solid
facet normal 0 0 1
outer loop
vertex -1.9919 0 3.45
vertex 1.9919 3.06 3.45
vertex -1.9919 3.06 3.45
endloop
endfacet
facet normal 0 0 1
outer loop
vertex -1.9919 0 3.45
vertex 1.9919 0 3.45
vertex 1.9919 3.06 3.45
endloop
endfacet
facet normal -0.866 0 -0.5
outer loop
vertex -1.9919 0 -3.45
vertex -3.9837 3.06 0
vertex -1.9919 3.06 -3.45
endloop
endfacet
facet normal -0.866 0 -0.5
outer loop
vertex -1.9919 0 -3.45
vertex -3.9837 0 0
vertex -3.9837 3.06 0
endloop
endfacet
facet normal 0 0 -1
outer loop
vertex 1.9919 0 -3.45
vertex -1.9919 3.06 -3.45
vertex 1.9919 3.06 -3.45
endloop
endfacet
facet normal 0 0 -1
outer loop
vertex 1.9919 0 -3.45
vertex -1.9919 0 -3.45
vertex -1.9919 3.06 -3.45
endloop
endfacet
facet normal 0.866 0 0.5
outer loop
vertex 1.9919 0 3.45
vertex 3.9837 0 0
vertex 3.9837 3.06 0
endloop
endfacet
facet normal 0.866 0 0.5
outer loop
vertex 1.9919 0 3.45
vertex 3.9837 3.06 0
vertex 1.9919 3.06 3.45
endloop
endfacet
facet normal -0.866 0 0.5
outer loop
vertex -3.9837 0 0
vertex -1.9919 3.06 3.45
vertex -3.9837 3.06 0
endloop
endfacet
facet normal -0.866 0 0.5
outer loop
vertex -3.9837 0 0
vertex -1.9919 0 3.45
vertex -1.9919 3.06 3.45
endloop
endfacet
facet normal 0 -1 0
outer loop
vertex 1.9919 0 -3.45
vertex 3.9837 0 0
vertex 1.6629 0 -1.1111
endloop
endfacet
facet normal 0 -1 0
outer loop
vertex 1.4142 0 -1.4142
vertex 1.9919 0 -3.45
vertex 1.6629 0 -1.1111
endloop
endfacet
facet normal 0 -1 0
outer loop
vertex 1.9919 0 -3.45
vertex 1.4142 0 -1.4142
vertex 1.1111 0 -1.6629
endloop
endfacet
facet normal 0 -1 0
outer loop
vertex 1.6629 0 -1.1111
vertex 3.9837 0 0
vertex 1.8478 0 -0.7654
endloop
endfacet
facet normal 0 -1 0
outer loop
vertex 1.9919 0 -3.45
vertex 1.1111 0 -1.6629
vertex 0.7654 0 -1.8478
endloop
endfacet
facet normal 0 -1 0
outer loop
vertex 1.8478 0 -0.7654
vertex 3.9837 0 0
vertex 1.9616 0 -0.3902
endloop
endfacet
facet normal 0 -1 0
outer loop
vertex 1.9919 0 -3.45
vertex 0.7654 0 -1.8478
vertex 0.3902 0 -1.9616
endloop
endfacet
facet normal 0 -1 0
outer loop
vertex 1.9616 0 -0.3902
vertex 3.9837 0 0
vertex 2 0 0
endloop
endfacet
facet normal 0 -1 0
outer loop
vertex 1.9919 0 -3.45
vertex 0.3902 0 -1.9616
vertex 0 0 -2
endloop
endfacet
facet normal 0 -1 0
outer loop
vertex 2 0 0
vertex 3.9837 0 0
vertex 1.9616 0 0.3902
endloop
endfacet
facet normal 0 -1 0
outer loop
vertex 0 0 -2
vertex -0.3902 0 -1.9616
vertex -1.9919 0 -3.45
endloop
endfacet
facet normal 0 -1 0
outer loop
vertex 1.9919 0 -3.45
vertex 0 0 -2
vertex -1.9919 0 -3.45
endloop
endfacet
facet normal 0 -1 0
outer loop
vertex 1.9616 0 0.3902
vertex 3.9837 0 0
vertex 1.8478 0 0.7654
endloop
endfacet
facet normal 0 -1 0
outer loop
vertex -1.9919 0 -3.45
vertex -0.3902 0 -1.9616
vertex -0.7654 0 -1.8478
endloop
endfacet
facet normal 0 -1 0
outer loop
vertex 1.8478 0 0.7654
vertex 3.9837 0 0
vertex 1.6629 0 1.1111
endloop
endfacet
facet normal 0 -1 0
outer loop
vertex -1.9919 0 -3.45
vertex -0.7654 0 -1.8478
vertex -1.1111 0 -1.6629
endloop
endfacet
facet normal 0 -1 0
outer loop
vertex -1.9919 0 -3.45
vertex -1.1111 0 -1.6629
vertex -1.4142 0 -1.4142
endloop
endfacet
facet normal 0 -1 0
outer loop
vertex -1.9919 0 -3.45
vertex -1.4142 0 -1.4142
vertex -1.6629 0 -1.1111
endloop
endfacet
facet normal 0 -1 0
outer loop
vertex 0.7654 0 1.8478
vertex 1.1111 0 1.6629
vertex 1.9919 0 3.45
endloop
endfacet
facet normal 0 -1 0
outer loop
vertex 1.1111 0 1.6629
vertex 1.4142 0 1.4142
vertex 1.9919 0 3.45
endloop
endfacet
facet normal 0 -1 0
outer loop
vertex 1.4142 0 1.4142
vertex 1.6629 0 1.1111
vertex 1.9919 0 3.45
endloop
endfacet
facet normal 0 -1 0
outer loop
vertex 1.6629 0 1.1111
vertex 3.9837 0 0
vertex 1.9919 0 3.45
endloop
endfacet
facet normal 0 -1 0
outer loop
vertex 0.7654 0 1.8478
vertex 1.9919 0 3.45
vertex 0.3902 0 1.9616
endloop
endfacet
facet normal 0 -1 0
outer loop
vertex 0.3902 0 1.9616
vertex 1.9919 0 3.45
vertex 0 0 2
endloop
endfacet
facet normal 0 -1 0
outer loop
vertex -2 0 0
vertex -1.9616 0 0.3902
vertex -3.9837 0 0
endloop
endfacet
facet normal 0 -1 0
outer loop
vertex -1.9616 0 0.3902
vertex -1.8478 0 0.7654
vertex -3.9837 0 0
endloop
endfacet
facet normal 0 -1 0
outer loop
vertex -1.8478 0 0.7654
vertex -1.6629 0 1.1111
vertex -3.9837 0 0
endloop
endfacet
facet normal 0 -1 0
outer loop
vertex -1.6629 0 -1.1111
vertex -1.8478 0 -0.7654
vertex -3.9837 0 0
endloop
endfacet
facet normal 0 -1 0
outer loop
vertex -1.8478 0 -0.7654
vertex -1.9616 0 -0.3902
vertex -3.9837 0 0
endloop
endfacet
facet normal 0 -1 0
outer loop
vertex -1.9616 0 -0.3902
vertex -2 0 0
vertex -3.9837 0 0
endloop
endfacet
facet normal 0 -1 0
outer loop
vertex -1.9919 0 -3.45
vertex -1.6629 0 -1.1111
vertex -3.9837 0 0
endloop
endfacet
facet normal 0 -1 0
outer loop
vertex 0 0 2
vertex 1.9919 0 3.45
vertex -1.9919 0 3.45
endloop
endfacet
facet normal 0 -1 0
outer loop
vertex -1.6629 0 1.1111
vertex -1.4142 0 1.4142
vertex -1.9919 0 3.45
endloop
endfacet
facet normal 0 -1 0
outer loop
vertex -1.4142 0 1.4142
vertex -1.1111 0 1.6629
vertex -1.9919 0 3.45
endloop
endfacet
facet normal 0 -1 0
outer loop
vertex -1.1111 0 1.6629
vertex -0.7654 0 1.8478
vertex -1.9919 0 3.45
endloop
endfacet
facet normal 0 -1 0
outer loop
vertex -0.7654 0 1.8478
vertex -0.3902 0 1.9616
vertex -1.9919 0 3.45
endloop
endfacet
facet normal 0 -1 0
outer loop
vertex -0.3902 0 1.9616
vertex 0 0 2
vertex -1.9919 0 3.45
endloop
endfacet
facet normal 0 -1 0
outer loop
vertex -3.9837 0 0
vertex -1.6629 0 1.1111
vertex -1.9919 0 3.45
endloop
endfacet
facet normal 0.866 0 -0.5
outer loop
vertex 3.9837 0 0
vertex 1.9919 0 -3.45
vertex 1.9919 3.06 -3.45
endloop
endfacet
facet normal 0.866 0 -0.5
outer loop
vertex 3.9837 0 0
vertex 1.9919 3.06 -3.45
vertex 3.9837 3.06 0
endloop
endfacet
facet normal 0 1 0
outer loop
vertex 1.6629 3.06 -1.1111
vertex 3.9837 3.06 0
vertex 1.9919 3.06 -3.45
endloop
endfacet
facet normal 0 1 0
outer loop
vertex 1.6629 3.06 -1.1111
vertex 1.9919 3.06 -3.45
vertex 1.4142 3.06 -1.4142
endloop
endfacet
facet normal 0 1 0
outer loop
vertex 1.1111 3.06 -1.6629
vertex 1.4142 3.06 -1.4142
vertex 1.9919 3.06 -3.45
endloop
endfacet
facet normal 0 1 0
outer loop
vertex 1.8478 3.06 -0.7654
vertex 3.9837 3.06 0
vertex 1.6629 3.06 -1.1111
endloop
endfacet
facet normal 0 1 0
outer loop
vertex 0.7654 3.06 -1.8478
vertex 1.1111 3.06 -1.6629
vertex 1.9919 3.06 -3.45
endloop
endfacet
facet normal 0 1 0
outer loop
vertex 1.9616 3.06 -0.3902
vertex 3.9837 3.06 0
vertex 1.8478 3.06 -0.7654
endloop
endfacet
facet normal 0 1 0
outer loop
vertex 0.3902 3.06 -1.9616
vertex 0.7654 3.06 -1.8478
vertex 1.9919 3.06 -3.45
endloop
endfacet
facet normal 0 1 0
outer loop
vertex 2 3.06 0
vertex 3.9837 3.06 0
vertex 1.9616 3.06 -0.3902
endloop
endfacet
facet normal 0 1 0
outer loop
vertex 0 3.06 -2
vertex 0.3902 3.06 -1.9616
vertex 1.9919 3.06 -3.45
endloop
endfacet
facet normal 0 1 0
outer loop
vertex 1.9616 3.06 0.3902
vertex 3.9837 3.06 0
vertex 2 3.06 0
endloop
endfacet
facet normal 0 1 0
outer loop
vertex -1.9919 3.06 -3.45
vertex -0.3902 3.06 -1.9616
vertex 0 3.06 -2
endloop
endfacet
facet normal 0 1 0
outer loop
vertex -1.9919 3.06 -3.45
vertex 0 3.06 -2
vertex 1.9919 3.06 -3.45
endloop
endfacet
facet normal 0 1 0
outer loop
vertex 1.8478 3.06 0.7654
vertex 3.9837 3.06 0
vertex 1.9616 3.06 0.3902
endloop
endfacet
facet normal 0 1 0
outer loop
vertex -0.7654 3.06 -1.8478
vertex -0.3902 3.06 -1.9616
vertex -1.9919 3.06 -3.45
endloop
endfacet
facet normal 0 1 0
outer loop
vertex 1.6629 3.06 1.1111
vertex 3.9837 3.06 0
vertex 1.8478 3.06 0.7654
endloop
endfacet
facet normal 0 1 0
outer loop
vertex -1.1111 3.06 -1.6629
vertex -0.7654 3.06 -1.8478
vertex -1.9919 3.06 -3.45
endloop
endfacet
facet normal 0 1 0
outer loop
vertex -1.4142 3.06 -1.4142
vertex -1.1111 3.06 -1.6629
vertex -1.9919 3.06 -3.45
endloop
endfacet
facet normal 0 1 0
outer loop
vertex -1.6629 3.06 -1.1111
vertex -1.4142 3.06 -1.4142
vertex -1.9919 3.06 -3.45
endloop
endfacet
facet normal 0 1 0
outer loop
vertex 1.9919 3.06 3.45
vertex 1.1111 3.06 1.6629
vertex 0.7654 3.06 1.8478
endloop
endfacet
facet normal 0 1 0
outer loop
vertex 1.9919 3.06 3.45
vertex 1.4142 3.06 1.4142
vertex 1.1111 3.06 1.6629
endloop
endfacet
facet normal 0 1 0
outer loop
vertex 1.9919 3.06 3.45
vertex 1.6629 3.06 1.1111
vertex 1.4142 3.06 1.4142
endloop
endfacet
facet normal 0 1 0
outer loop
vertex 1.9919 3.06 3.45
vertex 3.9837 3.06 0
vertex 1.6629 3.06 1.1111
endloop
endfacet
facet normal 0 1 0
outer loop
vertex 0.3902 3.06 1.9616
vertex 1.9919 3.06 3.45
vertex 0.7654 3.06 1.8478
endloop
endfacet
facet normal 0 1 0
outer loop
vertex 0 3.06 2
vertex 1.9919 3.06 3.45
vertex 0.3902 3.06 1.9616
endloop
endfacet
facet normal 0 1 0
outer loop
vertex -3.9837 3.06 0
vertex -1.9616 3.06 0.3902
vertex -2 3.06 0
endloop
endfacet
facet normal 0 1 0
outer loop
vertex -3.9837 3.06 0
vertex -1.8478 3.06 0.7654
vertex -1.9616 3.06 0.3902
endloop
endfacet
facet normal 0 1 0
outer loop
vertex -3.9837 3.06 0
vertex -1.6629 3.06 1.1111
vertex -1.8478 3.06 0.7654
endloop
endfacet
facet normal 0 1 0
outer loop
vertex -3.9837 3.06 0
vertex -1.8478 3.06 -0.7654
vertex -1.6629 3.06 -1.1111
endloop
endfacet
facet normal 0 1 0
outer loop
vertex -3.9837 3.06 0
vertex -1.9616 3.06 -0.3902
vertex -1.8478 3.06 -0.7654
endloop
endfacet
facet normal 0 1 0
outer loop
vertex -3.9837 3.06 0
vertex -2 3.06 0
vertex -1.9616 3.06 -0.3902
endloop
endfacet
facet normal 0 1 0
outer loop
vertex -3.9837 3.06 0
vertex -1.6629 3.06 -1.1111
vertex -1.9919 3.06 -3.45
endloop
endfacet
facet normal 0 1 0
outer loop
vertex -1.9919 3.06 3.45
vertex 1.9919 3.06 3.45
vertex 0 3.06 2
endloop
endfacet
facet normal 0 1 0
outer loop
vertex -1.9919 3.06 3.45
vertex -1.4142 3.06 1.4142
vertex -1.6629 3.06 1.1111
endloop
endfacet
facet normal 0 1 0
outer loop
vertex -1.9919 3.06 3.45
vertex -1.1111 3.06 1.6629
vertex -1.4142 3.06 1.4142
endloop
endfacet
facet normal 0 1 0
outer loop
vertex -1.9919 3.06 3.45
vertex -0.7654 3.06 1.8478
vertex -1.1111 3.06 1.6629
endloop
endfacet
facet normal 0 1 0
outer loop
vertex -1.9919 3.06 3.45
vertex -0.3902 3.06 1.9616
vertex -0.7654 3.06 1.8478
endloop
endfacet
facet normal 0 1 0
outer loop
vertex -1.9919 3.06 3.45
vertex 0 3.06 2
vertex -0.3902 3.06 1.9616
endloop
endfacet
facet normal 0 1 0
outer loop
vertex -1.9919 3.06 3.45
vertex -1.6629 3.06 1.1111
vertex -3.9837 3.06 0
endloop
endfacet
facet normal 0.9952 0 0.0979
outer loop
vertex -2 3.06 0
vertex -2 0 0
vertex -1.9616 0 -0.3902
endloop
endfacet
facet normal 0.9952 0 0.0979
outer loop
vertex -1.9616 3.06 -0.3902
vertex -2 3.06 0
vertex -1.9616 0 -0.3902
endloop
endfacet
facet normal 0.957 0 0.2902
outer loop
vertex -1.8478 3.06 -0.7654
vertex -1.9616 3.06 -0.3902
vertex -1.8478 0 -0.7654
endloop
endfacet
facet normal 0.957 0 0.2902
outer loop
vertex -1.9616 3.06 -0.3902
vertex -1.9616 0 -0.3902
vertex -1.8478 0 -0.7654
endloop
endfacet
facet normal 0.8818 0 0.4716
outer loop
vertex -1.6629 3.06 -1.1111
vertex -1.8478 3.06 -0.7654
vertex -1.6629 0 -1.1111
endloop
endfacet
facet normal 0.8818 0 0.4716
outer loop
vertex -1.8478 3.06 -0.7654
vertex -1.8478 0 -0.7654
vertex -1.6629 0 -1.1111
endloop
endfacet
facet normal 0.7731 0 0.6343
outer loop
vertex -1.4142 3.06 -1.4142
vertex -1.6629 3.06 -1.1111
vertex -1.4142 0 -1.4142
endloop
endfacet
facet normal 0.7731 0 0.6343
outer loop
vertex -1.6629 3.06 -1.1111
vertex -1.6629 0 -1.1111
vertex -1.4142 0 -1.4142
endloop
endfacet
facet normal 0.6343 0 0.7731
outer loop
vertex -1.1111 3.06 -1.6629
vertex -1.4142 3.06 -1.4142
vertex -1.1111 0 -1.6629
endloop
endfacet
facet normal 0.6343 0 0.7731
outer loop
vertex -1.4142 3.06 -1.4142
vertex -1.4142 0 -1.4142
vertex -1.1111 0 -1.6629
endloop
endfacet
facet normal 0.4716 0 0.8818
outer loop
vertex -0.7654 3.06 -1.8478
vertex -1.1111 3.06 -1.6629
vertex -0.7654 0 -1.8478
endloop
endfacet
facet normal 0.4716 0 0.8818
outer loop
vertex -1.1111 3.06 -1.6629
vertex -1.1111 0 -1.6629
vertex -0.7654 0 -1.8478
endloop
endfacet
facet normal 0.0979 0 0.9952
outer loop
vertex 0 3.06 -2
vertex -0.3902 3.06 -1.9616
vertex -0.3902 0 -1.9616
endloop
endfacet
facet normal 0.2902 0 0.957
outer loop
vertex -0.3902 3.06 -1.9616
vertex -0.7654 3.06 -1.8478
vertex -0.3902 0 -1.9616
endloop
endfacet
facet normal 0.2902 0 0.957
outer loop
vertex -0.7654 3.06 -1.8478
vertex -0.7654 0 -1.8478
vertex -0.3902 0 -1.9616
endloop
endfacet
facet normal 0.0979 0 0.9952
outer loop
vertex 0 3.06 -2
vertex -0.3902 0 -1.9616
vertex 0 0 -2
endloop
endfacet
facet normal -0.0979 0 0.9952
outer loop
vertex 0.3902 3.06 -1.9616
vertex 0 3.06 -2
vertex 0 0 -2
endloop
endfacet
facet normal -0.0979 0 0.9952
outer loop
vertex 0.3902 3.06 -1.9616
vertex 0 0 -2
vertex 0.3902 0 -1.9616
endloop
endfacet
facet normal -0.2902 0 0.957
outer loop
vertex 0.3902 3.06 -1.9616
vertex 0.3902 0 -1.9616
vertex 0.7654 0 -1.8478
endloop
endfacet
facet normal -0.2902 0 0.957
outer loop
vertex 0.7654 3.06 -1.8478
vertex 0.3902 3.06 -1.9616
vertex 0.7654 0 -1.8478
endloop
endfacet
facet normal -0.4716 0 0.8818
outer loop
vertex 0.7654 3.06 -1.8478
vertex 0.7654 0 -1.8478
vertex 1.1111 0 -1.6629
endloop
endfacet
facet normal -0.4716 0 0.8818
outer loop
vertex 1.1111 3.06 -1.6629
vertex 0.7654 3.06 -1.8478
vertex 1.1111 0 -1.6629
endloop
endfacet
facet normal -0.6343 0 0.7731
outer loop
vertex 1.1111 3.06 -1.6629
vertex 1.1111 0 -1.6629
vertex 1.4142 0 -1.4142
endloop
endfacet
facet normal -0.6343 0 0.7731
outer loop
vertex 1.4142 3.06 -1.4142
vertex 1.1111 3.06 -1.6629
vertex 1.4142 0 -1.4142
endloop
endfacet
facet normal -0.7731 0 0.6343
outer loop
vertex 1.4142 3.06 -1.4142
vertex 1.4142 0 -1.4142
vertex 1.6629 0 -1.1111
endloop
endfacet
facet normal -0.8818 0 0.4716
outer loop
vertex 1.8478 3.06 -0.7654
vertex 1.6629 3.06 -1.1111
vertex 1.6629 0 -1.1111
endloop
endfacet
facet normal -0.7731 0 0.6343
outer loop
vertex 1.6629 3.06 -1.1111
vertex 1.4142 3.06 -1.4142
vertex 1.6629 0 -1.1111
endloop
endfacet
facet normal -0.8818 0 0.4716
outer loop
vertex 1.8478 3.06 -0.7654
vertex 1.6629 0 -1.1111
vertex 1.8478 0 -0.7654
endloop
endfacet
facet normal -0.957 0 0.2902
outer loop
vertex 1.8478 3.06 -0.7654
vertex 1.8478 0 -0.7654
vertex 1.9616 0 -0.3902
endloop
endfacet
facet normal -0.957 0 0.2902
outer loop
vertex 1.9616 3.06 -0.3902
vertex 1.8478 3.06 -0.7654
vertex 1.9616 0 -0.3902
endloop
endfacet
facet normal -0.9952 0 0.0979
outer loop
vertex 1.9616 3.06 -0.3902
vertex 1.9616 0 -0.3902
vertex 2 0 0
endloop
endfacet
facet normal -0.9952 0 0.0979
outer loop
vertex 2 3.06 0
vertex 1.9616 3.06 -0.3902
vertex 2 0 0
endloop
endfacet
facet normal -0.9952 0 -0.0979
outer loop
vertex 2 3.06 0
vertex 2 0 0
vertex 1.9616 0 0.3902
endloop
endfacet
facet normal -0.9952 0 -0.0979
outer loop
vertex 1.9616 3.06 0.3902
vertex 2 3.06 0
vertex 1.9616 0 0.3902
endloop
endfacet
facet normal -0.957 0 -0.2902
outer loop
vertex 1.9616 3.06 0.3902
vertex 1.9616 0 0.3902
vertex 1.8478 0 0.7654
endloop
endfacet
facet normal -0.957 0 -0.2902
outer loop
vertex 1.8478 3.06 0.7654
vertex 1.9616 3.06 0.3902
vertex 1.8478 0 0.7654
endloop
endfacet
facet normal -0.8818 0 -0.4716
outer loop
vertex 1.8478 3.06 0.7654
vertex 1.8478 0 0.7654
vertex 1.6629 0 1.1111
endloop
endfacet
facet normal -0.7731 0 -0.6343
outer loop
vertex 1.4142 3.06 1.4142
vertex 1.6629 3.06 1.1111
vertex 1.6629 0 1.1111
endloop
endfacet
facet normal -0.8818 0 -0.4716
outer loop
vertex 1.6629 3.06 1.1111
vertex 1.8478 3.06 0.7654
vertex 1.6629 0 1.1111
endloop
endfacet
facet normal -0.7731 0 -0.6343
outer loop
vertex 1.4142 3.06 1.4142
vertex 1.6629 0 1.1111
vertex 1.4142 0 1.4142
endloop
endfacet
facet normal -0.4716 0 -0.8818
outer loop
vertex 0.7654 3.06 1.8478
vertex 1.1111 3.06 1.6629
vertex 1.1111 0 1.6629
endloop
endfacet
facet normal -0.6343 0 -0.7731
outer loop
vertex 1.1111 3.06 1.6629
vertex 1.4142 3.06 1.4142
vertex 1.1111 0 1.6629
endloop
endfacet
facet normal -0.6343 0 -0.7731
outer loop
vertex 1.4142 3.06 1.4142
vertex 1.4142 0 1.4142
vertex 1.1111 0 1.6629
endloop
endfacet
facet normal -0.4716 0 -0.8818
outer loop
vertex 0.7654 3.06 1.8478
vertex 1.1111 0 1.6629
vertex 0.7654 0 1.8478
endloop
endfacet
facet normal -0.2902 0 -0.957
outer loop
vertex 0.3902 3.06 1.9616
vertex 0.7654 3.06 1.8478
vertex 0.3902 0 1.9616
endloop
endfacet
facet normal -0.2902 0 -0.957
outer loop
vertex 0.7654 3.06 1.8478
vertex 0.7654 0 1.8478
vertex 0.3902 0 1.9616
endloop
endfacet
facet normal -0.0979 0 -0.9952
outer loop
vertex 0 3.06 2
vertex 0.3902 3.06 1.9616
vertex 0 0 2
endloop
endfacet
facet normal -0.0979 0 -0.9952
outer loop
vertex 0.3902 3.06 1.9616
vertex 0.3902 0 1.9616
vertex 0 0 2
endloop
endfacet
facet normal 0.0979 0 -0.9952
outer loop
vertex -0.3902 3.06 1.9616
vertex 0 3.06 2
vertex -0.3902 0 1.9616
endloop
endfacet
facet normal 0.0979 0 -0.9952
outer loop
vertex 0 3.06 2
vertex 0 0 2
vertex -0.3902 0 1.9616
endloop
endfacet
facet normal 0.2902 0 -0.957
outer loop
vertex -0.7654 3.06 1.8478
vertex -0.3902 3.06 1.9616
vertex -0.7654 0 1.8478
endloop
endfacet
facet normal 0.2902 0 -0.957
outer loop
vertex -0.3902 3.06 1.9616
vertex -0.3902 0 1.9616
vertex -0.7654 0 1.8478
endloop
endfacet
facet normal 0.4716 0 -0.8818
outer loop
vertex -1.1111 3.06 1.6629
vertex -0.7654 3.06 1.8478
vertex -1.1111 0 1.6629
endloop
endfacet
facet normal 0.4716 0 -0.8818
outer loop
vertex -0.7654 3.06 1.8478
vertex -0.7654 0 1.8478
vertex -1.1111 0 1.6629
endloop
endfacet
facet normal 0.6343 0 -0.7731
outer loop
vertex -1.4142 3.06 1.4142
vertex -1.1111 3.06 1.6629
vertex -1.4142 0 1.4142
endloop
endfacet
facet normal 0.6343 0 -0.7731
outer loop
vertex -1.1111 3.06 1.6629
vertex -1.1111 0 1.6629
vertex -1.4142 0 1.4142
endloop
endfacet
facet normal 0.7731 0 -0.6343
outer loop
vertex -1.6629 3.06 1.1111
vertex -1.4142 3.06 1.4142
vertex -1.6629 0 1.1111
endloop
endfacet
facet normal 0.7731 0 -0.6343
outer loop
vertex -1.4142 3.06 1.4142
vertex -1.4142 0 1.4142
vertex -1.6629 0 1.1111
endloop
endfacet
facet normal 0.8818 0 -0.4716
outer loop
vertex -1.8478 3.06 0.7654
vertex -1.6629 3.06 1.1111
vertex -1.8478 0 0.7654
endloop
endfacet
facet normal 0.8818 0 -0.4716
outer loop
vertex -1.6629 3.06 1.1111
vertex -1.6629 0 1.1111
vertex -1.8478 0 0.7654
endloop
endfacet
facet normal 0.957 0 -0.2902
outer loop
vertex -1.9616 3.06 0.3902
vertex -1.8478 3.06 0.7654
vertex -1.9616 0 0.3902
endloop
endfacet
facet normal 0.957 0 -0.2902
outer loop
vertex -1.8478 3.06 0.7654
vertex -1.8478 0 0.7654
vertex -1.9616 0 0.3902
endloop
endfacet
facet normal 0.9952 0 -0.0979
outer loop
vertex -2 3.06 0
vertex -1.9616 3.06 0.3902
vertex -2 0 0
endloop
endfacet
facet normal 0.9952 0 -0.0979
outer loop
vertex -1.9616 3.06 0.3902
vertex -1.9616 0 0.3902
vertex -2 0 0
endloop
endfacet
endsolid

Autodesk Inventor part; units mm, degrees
ref_plane "YZ Plane" through (0, 0, 0) normal (1, 0, 0) x (0, 1, 0)
ref_plane "XZ Plane" through (0, 0, 0) normal (0, 1, 0) x (-1, 0, 0)
ref_plane "XY Plane" through (0, 0, 0) normal (0, 0, 1) x (1, 0, 0)
sketch "Sketch1" plane through (0, 0, 0) normal (0, 1, 0) x (-1, 0, 0)
  circle A0 centre (0, 0) radius 2
  line L0 (-1.9919, -3.45) -> (-3.9837, 0)
  line L1 (-3.9837, 0) -> (-1.9919, 3.45)
  line L2 (-1.9919, 3.45) -> (1.9919, 3.45)
  line L3 (1.9919, 3.45) -> (3.9837, 0)
  line L4 (3.9837, 0) -> (1.9919, -3.45)
  line L5 (1.9919, -3.45) -> (-1.9919, -3.45)
  line L6 (0, 0) -> (9.6963, 0) construction
  dimension "d0" = 6.9
  dimension "d1" = 4
extrude "Extrusion1" add sketch "Sketch1" along normal blind 3.06
thread "Thread1" size "M4x0.7" class "6H" standard "ISO Metric profile" length 180
properties part number "M4 nut"
